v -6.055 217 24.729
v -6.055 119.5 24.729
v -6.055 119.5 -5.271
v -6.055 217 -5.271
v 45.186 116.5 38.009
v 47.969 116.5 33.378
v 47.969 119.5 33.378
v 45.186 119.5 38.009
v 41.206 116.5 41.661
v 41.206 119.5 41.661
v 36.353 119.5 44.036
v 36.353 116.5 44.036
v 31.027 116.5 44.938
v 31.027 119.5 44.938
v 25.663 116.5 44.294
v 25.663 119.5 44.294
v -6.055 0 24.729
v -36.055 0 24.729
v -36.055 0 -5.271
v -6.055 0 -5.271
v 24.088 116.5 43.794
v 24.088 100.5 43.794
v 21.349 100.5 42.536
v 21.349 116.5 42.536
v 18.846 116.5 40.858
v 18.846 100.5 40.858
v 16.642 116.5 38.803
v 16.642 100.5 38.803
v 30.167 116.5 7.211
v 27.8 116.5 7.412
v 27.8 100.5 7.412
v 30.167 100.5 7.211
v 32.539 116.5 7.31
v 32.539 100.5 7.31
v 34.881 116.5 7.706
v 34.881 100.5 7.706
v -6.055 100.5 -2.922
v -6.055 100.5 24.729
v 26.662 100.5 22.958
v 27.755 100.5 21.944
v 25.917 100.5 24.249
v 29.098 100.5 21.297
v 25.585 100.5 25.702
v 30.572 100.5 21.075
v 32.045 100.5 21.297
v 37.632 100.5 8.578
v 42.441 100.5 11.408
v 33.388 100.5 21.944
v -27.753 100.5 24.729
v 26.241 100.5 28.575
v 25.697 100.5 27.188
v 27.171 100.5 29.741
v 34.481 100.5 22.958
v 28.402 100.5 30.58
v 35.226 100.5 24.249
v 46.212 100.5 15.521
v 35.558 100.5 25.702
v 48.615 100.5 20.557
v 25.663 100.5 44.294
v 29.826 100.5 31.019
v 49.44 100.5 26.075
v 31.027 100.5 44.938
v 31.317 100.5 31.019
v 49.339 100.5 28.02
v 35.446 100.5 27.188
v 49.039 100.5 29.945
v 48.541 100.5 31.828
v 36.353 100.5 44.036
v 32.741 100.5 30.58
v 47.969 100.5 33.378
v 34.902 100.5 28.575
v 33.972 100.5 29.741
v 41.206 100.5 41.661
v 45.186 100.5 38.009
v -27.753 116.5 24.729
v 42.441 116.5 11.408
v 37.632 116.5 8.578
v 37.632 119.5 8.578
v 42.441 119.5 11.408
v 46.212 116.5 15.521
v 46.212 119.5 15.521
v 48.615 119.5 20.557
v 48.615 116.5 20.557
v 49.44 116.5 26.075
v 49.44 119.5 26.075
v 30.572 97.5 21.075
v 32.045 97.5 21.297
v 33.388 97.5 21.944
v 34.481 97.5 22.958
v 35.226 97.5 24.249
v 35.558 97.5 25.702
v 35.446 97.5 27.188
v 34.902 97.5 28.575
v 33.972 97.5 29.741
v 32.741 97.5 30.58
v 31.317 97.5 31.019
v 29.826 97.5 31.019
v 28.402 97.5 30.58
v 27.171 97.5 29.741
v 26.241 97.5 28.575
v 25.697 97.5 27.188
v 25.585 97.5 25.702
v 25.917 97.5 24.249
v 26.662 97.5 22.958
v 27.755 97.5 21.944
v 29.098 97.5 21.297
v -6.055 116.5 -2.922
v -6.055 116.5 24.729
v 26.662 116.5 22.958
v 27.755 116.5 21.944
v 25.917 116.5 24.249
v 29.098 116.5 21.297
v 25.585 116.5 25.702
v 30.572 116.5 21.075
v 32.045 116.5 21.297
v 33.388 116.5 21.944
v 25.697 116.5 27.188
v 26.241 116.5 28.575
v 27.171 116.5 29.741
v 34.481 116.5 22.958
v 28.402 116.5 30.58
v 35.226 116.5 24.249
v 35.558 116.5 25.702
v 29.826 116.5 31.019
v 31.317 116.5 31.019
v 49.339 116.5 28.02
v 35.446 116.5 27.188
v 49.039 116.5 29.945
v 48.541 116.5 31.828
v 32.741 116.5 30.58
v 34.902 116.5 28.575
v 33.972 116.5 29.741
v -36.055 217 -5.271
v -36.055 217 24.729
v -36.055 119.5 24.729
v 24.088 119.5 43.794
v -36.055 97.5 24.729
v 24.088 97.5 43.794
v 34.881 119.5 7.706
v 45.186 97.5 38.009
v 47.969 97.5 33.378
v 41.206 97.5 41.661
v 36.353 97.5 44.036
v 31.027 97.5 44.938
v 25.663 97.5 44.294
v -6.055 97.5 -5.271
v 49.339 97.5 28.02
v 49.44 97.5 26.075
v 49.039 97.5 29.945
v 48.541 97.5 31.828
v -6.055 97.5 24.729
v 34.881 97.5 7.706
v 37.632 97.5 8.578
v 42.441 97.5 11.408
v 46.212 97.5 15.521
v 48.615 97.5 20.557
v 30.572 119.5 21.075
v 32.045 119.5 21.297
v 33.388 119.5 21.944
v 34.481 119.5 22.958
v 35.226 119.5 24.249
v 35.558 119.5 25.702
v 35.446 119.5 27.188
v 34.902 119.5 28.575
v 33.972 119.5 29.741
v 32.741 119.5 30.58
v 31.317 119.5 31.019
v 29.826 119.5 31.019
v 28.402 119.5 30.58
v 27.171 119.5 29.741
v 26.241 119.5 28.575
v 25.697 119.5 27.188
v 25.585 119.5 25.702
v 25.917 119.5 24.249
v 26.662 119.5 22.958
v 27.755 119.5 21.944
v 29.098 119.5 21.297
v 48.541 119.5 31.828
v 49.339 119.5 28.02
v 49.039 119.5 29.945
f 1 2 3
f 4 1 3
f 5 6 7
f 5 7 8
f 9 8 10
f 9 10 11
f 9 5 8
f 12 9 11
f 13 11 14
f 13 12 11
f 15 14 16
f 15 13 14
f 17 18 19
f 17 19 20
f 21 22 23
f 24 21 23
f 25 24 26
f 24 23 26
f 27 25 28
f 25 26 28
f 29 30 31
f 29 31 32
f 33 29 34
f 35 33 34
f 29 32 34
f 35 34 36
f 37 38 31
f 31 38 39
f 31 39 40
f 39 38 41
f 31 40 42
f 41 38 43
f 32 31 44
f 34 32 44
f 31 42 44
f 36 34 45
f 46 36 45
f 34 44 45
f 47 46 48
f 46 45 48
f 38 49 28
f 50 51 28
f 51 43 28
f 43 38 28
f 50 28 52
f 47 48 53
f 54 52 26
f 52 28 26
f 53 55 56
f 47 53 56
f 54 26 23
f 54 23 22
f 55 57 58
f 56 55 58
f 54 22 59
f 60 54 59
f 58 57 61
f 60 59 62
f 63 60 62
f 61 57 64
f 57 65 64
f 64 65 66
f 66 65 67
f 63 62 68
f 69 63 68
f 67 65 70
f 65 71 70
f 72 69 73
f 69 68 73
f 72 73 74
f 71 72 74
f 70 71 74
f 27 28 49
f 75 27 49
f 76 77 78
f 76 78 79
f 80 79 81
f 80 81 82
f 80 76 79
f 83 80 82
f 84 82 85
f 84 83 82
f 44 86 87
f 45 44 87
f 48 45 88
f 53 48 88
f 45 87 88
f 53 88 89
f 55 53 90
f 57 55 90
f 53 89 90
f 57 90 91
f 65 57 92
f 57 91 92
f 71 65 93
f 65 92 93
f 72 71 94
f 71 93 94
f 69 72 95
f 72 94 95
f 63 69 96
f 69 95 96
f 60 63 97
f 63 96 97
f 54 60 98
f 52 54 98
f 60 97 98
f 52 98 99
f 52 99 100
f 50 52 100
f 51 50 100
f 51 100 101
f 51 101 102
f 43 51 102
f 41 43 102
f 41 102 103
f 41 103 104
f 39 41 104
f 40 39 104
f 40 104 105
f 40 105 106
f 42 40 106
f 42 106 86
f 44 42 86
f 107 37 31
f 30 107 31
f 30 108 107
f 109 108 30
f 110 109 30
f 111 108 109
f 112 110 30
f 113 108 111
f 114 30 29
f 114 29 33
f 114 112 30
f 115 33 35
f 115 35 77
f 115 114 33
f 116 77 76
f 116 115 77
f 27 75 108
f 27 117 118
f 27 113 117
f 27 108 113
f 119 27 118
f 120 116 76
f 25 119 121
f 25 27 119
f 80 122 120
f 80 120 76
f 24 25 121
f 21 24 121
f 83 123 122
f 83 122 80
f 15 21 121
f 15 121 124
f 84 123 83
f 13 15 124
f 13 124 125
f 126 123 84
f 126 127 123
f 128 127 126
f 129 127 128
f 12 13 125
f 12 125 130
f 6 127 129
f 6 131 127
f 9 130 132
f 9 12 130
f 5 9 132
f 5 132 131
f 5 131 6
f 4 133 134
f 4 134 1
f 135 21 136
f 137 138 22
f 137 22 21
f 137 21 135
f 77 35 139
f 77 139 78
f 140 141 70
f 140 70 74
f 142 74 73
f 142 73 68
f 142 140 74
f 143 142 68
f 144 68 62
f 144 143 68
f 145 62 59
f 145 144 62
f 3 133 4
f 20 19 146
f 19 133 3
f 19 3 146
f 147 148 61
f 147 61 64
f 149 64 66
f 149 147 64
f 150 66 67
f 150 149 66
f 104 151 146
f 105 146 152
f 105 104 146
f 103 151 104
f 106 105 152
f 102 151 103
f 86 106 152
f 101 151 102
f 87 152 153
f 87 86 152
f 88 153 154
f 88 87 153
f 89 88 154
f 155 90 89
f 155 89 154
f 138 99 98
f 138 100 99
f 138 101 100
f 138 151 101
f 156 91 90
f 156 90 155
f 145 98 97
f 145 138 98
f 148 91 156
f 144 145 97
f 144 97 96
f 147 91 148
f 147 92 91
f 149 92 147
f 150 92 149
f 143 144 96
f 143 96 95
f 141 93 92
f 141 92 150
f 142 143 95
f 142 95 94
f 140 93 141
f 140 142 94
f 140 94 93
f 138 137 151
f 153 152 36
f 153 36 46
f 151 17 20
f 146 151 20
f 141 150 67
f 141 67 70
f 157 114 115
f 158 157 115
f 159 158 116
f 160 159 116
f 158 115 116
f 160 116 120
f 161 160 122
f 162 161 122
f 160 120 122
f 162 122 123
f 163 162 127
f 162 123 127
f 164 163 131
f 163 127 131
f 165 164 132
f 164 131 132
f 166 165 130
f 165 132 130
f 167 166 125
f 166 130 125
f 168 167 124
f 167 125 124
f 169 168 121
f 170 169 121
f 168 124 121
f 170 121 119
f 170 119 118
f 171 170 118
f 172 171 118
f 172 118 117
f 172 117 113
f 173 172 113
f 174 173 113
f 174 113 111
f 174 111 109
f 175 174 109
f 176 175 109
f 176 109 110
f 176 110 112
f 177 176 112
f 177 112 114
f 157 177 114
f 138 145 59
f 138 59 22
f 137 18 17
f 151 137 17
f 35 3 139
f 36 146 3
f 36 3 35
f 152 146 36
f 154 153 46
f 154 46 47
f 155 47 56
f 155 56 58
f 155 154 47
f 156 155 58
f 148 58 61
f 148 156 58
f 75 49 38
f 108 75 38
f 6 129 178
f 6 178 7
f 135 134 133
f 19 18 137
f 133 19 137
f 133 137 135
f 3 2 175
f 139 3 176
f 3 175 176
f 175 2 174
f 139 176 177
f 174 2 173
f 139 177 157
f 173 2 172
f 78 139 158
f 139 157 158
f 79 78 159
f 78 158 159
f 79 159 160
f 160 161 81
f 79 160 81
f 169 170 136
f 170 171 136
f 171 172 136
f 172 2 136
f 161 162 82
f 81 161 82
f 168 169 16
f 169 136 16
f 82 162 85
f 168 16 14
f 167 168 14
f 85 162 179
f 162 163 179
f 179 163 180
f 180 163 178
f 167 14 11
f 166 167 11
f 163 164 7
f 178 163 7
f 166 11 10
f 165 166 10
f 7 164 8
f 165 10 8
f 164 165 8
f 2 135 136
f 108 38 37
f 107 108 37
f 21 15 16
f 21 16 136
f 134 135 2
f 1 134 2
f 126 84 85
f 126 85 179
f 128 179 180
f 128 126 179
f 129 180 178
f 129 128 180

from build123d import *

# Parameters (mm, degrees)
SKETCH1_W           = 30
SKETCH1_H           = 30
BOSS_EXTRUDE1_DEPTH = 217
SKETCH2_R           = 5
BOSS_EXTRUDE3_DEPTH = 119.5
SKETCH2_5_R         = 5
CUT_EXTRUDE1_DEPTH  = 116.5
SKETCH2_6_R         = 5
BOSS_EXTRUDE4_DEPTH = 100.5
SKETCH2_7_R         = 5
CUT_EXTRUDE2_DEPTH  = 97.5


with BuildPart() as part:
    # Sketch1 → Boss-Extrude1 (new body)
    with BuildSketch(Plane(origin=(0, 0, 0), x_dir=(1, 0, 0), z_dir=(0, 1, 0))):
        with Locations((-21.055045872, -9.729357798)):
            Rectangle(SKETCH1_W, SKETCH1_H)
    extrude(amount=BOSS_EXTRUDE1_DEPTH)

    # Sketch2 → Boss-Extrude3 (add)
    with BuildSketch(Plane.XZ):
        with BuildLine():
            Line((-36.055045872, 24.729357798), (-6.055045872, 24.729357798))
            Line((-6.055045872, 24.729357798), (-6.055045872, -5.270642202))
            Line((-6.055045872, -5.270642202), (37.631757216, 8.577867353))
            ThreePointArc((37.631757216, 8.577867353), (47.652639906, 18.060239777), (48.541325909, 31.827727342))
            Line((48.541325909, 31.827727342), (47.968990161, 33.37819141))
            ThreePointArc((47.968990161, 33.37819141), (38.865020701, 43.022901823), (25.663216571, 44.293754521))
            Line((25.663216571, 44.293754521), (-36.055045872, 24.729357798))
        make_face()
        with Locations((30.57150852, 26.07524616)):
            Circle(SKETCH2_R, mode=Mode.SUBTRACT)
    extrude(amount=-BOSS_EXTRUDE3_DEPTH)

    # Sketch2<5> → Cut-Extrude1 (cut)
    with BuildSketch(Plane.XZ):
        with BuildLine():
            Line((25.663216571, 44.293754521), (24.087751056, 43.794339419))
            ThreePointArc((24.087751056, 43.794339419), (20.064375993, 41.747053421), (16.642463995, 38.80266127))
            Line((16.642463995, 38.80266127), (-27.753478769, 24.729357798))
            Line((-27.753478769, 24.729357798), (-6.055045872, 24.729357798))
            Line((-6.055045872, 24.729357798), (-6.055045872, -2.922177327))
            Line((-6.055045872, -2.922177327), (27.800199491, 7.411773197))
            ThreePointArc((27.800199491, 7.411773197), (31.354459639, 7.223393087), (34.880858909, 7.705845626))
            Line((34.880858909, 7.705845626), (37.631757216, 8.577867353))
            ThreePointArc((37.631757216, 8.577867353), (47.652639906, 18.060239777), (48.541325909, 31.827727342))
            Line((48.541325909, 31.827727342), (47.968990161, 33.37819141))
            ThreePointArc((47.968990161, 33.37819141), (38.865020701, 43.022901823), (25.663216571, 44.293754521))
        make_face()
        with Locations((30.57150852, 26.07524616)):
            Circle(SKETCH2_5_R, mode=Mode.SUBTRACT)
    extrude(amount=-CUT_EXTRUDE1_DEPTH, mode=Mode.SUBTRACT)

    # Sketch2<6> → Boss-Extrude4 (add)
    with BuildSketch(Plane.XZ):
        with BuildLine():
            Line((25.663216571, 44.293754521), (24.087751056, 43.794339419))
            ThreePointArc((24.087751056, 43.794339419), (20.064375993, 41.747053421), (16.642463995, 38.80266127))
            Line((16.642463995, 38.80266127), (-27.753478769, 24.729357798))
            Line((-27.753478769, 24.729357798), (-6.055045872, 24.729357798))
            Line((-6.055045872, 24.729357798), (-6.055045872, -2.922177327))
            Line((-6.055045872, -2.922177327), (27.800199491, 7.411773197))
            ThreePointArc((27.800199491, 7.411773197), (31.354459639, 7.223393087), (34.880858909, 7.705845626))
            Line((34.880858909, 7.705845626), (37.631757216, 8.577867353))
            ThreePointArc((37.631757216, 8.577867353), (47.652639906, 18.060239777), (48.541325909, 31.827727342))
            Line((48.541325909, 31.827727342), (47.968990161, 33.37819141))
            ThreePointArc((47.968990161, 33.37819141), (38.865020701, 43.022901823), (25.663216571, 44.293754521))
        make_face()
        with Locations((30.57150852, 26.07524616)):
            Circle(SKETCH2_6_R, mode=Mode.SUBTRACT)
    extrude(amount=-BOSS_EXTRUDE4_DEPTH)

    # Sketch2<7> → Cut-Extrude2 (cut)
    with BuildSketch(Plane.XZ):
        with BuildLine():
            Line((-36.055045872, 24.729357798), (-6.055045872, 24.729357798))
            Line((-6.055045872, 24.729357798), (-6.055045872, -5.270642202))
            Line((-6.055045872, -5.270642202), (37.631757216, 8.577867353))
            ThreePointArc((37.631757216, 8.577867353), (47.652639906, 18.060239777), (48.541325909, 31.827727342))
            Line((48.541325909, 31.827727342), (47.968990161, 33.37819141))
            ThreePointArc((47.968990161, 33.37819141), (38.865020701, 43.022901823), (25.663216571, 44.293754521))
            Line((25.663216571, 44.293754521), (-36.055045872, 24.729357798))
        make_face()
        with Locations((30.57150852, 26.07524616)):
            Circle(SKETCH2_7_R, mode=Mode.SUBTRACT)
    extrude(amount=-CUT_EXTRUDE2_DEPTH, mode=Mode.SUBTRACT)


solid = part.part
